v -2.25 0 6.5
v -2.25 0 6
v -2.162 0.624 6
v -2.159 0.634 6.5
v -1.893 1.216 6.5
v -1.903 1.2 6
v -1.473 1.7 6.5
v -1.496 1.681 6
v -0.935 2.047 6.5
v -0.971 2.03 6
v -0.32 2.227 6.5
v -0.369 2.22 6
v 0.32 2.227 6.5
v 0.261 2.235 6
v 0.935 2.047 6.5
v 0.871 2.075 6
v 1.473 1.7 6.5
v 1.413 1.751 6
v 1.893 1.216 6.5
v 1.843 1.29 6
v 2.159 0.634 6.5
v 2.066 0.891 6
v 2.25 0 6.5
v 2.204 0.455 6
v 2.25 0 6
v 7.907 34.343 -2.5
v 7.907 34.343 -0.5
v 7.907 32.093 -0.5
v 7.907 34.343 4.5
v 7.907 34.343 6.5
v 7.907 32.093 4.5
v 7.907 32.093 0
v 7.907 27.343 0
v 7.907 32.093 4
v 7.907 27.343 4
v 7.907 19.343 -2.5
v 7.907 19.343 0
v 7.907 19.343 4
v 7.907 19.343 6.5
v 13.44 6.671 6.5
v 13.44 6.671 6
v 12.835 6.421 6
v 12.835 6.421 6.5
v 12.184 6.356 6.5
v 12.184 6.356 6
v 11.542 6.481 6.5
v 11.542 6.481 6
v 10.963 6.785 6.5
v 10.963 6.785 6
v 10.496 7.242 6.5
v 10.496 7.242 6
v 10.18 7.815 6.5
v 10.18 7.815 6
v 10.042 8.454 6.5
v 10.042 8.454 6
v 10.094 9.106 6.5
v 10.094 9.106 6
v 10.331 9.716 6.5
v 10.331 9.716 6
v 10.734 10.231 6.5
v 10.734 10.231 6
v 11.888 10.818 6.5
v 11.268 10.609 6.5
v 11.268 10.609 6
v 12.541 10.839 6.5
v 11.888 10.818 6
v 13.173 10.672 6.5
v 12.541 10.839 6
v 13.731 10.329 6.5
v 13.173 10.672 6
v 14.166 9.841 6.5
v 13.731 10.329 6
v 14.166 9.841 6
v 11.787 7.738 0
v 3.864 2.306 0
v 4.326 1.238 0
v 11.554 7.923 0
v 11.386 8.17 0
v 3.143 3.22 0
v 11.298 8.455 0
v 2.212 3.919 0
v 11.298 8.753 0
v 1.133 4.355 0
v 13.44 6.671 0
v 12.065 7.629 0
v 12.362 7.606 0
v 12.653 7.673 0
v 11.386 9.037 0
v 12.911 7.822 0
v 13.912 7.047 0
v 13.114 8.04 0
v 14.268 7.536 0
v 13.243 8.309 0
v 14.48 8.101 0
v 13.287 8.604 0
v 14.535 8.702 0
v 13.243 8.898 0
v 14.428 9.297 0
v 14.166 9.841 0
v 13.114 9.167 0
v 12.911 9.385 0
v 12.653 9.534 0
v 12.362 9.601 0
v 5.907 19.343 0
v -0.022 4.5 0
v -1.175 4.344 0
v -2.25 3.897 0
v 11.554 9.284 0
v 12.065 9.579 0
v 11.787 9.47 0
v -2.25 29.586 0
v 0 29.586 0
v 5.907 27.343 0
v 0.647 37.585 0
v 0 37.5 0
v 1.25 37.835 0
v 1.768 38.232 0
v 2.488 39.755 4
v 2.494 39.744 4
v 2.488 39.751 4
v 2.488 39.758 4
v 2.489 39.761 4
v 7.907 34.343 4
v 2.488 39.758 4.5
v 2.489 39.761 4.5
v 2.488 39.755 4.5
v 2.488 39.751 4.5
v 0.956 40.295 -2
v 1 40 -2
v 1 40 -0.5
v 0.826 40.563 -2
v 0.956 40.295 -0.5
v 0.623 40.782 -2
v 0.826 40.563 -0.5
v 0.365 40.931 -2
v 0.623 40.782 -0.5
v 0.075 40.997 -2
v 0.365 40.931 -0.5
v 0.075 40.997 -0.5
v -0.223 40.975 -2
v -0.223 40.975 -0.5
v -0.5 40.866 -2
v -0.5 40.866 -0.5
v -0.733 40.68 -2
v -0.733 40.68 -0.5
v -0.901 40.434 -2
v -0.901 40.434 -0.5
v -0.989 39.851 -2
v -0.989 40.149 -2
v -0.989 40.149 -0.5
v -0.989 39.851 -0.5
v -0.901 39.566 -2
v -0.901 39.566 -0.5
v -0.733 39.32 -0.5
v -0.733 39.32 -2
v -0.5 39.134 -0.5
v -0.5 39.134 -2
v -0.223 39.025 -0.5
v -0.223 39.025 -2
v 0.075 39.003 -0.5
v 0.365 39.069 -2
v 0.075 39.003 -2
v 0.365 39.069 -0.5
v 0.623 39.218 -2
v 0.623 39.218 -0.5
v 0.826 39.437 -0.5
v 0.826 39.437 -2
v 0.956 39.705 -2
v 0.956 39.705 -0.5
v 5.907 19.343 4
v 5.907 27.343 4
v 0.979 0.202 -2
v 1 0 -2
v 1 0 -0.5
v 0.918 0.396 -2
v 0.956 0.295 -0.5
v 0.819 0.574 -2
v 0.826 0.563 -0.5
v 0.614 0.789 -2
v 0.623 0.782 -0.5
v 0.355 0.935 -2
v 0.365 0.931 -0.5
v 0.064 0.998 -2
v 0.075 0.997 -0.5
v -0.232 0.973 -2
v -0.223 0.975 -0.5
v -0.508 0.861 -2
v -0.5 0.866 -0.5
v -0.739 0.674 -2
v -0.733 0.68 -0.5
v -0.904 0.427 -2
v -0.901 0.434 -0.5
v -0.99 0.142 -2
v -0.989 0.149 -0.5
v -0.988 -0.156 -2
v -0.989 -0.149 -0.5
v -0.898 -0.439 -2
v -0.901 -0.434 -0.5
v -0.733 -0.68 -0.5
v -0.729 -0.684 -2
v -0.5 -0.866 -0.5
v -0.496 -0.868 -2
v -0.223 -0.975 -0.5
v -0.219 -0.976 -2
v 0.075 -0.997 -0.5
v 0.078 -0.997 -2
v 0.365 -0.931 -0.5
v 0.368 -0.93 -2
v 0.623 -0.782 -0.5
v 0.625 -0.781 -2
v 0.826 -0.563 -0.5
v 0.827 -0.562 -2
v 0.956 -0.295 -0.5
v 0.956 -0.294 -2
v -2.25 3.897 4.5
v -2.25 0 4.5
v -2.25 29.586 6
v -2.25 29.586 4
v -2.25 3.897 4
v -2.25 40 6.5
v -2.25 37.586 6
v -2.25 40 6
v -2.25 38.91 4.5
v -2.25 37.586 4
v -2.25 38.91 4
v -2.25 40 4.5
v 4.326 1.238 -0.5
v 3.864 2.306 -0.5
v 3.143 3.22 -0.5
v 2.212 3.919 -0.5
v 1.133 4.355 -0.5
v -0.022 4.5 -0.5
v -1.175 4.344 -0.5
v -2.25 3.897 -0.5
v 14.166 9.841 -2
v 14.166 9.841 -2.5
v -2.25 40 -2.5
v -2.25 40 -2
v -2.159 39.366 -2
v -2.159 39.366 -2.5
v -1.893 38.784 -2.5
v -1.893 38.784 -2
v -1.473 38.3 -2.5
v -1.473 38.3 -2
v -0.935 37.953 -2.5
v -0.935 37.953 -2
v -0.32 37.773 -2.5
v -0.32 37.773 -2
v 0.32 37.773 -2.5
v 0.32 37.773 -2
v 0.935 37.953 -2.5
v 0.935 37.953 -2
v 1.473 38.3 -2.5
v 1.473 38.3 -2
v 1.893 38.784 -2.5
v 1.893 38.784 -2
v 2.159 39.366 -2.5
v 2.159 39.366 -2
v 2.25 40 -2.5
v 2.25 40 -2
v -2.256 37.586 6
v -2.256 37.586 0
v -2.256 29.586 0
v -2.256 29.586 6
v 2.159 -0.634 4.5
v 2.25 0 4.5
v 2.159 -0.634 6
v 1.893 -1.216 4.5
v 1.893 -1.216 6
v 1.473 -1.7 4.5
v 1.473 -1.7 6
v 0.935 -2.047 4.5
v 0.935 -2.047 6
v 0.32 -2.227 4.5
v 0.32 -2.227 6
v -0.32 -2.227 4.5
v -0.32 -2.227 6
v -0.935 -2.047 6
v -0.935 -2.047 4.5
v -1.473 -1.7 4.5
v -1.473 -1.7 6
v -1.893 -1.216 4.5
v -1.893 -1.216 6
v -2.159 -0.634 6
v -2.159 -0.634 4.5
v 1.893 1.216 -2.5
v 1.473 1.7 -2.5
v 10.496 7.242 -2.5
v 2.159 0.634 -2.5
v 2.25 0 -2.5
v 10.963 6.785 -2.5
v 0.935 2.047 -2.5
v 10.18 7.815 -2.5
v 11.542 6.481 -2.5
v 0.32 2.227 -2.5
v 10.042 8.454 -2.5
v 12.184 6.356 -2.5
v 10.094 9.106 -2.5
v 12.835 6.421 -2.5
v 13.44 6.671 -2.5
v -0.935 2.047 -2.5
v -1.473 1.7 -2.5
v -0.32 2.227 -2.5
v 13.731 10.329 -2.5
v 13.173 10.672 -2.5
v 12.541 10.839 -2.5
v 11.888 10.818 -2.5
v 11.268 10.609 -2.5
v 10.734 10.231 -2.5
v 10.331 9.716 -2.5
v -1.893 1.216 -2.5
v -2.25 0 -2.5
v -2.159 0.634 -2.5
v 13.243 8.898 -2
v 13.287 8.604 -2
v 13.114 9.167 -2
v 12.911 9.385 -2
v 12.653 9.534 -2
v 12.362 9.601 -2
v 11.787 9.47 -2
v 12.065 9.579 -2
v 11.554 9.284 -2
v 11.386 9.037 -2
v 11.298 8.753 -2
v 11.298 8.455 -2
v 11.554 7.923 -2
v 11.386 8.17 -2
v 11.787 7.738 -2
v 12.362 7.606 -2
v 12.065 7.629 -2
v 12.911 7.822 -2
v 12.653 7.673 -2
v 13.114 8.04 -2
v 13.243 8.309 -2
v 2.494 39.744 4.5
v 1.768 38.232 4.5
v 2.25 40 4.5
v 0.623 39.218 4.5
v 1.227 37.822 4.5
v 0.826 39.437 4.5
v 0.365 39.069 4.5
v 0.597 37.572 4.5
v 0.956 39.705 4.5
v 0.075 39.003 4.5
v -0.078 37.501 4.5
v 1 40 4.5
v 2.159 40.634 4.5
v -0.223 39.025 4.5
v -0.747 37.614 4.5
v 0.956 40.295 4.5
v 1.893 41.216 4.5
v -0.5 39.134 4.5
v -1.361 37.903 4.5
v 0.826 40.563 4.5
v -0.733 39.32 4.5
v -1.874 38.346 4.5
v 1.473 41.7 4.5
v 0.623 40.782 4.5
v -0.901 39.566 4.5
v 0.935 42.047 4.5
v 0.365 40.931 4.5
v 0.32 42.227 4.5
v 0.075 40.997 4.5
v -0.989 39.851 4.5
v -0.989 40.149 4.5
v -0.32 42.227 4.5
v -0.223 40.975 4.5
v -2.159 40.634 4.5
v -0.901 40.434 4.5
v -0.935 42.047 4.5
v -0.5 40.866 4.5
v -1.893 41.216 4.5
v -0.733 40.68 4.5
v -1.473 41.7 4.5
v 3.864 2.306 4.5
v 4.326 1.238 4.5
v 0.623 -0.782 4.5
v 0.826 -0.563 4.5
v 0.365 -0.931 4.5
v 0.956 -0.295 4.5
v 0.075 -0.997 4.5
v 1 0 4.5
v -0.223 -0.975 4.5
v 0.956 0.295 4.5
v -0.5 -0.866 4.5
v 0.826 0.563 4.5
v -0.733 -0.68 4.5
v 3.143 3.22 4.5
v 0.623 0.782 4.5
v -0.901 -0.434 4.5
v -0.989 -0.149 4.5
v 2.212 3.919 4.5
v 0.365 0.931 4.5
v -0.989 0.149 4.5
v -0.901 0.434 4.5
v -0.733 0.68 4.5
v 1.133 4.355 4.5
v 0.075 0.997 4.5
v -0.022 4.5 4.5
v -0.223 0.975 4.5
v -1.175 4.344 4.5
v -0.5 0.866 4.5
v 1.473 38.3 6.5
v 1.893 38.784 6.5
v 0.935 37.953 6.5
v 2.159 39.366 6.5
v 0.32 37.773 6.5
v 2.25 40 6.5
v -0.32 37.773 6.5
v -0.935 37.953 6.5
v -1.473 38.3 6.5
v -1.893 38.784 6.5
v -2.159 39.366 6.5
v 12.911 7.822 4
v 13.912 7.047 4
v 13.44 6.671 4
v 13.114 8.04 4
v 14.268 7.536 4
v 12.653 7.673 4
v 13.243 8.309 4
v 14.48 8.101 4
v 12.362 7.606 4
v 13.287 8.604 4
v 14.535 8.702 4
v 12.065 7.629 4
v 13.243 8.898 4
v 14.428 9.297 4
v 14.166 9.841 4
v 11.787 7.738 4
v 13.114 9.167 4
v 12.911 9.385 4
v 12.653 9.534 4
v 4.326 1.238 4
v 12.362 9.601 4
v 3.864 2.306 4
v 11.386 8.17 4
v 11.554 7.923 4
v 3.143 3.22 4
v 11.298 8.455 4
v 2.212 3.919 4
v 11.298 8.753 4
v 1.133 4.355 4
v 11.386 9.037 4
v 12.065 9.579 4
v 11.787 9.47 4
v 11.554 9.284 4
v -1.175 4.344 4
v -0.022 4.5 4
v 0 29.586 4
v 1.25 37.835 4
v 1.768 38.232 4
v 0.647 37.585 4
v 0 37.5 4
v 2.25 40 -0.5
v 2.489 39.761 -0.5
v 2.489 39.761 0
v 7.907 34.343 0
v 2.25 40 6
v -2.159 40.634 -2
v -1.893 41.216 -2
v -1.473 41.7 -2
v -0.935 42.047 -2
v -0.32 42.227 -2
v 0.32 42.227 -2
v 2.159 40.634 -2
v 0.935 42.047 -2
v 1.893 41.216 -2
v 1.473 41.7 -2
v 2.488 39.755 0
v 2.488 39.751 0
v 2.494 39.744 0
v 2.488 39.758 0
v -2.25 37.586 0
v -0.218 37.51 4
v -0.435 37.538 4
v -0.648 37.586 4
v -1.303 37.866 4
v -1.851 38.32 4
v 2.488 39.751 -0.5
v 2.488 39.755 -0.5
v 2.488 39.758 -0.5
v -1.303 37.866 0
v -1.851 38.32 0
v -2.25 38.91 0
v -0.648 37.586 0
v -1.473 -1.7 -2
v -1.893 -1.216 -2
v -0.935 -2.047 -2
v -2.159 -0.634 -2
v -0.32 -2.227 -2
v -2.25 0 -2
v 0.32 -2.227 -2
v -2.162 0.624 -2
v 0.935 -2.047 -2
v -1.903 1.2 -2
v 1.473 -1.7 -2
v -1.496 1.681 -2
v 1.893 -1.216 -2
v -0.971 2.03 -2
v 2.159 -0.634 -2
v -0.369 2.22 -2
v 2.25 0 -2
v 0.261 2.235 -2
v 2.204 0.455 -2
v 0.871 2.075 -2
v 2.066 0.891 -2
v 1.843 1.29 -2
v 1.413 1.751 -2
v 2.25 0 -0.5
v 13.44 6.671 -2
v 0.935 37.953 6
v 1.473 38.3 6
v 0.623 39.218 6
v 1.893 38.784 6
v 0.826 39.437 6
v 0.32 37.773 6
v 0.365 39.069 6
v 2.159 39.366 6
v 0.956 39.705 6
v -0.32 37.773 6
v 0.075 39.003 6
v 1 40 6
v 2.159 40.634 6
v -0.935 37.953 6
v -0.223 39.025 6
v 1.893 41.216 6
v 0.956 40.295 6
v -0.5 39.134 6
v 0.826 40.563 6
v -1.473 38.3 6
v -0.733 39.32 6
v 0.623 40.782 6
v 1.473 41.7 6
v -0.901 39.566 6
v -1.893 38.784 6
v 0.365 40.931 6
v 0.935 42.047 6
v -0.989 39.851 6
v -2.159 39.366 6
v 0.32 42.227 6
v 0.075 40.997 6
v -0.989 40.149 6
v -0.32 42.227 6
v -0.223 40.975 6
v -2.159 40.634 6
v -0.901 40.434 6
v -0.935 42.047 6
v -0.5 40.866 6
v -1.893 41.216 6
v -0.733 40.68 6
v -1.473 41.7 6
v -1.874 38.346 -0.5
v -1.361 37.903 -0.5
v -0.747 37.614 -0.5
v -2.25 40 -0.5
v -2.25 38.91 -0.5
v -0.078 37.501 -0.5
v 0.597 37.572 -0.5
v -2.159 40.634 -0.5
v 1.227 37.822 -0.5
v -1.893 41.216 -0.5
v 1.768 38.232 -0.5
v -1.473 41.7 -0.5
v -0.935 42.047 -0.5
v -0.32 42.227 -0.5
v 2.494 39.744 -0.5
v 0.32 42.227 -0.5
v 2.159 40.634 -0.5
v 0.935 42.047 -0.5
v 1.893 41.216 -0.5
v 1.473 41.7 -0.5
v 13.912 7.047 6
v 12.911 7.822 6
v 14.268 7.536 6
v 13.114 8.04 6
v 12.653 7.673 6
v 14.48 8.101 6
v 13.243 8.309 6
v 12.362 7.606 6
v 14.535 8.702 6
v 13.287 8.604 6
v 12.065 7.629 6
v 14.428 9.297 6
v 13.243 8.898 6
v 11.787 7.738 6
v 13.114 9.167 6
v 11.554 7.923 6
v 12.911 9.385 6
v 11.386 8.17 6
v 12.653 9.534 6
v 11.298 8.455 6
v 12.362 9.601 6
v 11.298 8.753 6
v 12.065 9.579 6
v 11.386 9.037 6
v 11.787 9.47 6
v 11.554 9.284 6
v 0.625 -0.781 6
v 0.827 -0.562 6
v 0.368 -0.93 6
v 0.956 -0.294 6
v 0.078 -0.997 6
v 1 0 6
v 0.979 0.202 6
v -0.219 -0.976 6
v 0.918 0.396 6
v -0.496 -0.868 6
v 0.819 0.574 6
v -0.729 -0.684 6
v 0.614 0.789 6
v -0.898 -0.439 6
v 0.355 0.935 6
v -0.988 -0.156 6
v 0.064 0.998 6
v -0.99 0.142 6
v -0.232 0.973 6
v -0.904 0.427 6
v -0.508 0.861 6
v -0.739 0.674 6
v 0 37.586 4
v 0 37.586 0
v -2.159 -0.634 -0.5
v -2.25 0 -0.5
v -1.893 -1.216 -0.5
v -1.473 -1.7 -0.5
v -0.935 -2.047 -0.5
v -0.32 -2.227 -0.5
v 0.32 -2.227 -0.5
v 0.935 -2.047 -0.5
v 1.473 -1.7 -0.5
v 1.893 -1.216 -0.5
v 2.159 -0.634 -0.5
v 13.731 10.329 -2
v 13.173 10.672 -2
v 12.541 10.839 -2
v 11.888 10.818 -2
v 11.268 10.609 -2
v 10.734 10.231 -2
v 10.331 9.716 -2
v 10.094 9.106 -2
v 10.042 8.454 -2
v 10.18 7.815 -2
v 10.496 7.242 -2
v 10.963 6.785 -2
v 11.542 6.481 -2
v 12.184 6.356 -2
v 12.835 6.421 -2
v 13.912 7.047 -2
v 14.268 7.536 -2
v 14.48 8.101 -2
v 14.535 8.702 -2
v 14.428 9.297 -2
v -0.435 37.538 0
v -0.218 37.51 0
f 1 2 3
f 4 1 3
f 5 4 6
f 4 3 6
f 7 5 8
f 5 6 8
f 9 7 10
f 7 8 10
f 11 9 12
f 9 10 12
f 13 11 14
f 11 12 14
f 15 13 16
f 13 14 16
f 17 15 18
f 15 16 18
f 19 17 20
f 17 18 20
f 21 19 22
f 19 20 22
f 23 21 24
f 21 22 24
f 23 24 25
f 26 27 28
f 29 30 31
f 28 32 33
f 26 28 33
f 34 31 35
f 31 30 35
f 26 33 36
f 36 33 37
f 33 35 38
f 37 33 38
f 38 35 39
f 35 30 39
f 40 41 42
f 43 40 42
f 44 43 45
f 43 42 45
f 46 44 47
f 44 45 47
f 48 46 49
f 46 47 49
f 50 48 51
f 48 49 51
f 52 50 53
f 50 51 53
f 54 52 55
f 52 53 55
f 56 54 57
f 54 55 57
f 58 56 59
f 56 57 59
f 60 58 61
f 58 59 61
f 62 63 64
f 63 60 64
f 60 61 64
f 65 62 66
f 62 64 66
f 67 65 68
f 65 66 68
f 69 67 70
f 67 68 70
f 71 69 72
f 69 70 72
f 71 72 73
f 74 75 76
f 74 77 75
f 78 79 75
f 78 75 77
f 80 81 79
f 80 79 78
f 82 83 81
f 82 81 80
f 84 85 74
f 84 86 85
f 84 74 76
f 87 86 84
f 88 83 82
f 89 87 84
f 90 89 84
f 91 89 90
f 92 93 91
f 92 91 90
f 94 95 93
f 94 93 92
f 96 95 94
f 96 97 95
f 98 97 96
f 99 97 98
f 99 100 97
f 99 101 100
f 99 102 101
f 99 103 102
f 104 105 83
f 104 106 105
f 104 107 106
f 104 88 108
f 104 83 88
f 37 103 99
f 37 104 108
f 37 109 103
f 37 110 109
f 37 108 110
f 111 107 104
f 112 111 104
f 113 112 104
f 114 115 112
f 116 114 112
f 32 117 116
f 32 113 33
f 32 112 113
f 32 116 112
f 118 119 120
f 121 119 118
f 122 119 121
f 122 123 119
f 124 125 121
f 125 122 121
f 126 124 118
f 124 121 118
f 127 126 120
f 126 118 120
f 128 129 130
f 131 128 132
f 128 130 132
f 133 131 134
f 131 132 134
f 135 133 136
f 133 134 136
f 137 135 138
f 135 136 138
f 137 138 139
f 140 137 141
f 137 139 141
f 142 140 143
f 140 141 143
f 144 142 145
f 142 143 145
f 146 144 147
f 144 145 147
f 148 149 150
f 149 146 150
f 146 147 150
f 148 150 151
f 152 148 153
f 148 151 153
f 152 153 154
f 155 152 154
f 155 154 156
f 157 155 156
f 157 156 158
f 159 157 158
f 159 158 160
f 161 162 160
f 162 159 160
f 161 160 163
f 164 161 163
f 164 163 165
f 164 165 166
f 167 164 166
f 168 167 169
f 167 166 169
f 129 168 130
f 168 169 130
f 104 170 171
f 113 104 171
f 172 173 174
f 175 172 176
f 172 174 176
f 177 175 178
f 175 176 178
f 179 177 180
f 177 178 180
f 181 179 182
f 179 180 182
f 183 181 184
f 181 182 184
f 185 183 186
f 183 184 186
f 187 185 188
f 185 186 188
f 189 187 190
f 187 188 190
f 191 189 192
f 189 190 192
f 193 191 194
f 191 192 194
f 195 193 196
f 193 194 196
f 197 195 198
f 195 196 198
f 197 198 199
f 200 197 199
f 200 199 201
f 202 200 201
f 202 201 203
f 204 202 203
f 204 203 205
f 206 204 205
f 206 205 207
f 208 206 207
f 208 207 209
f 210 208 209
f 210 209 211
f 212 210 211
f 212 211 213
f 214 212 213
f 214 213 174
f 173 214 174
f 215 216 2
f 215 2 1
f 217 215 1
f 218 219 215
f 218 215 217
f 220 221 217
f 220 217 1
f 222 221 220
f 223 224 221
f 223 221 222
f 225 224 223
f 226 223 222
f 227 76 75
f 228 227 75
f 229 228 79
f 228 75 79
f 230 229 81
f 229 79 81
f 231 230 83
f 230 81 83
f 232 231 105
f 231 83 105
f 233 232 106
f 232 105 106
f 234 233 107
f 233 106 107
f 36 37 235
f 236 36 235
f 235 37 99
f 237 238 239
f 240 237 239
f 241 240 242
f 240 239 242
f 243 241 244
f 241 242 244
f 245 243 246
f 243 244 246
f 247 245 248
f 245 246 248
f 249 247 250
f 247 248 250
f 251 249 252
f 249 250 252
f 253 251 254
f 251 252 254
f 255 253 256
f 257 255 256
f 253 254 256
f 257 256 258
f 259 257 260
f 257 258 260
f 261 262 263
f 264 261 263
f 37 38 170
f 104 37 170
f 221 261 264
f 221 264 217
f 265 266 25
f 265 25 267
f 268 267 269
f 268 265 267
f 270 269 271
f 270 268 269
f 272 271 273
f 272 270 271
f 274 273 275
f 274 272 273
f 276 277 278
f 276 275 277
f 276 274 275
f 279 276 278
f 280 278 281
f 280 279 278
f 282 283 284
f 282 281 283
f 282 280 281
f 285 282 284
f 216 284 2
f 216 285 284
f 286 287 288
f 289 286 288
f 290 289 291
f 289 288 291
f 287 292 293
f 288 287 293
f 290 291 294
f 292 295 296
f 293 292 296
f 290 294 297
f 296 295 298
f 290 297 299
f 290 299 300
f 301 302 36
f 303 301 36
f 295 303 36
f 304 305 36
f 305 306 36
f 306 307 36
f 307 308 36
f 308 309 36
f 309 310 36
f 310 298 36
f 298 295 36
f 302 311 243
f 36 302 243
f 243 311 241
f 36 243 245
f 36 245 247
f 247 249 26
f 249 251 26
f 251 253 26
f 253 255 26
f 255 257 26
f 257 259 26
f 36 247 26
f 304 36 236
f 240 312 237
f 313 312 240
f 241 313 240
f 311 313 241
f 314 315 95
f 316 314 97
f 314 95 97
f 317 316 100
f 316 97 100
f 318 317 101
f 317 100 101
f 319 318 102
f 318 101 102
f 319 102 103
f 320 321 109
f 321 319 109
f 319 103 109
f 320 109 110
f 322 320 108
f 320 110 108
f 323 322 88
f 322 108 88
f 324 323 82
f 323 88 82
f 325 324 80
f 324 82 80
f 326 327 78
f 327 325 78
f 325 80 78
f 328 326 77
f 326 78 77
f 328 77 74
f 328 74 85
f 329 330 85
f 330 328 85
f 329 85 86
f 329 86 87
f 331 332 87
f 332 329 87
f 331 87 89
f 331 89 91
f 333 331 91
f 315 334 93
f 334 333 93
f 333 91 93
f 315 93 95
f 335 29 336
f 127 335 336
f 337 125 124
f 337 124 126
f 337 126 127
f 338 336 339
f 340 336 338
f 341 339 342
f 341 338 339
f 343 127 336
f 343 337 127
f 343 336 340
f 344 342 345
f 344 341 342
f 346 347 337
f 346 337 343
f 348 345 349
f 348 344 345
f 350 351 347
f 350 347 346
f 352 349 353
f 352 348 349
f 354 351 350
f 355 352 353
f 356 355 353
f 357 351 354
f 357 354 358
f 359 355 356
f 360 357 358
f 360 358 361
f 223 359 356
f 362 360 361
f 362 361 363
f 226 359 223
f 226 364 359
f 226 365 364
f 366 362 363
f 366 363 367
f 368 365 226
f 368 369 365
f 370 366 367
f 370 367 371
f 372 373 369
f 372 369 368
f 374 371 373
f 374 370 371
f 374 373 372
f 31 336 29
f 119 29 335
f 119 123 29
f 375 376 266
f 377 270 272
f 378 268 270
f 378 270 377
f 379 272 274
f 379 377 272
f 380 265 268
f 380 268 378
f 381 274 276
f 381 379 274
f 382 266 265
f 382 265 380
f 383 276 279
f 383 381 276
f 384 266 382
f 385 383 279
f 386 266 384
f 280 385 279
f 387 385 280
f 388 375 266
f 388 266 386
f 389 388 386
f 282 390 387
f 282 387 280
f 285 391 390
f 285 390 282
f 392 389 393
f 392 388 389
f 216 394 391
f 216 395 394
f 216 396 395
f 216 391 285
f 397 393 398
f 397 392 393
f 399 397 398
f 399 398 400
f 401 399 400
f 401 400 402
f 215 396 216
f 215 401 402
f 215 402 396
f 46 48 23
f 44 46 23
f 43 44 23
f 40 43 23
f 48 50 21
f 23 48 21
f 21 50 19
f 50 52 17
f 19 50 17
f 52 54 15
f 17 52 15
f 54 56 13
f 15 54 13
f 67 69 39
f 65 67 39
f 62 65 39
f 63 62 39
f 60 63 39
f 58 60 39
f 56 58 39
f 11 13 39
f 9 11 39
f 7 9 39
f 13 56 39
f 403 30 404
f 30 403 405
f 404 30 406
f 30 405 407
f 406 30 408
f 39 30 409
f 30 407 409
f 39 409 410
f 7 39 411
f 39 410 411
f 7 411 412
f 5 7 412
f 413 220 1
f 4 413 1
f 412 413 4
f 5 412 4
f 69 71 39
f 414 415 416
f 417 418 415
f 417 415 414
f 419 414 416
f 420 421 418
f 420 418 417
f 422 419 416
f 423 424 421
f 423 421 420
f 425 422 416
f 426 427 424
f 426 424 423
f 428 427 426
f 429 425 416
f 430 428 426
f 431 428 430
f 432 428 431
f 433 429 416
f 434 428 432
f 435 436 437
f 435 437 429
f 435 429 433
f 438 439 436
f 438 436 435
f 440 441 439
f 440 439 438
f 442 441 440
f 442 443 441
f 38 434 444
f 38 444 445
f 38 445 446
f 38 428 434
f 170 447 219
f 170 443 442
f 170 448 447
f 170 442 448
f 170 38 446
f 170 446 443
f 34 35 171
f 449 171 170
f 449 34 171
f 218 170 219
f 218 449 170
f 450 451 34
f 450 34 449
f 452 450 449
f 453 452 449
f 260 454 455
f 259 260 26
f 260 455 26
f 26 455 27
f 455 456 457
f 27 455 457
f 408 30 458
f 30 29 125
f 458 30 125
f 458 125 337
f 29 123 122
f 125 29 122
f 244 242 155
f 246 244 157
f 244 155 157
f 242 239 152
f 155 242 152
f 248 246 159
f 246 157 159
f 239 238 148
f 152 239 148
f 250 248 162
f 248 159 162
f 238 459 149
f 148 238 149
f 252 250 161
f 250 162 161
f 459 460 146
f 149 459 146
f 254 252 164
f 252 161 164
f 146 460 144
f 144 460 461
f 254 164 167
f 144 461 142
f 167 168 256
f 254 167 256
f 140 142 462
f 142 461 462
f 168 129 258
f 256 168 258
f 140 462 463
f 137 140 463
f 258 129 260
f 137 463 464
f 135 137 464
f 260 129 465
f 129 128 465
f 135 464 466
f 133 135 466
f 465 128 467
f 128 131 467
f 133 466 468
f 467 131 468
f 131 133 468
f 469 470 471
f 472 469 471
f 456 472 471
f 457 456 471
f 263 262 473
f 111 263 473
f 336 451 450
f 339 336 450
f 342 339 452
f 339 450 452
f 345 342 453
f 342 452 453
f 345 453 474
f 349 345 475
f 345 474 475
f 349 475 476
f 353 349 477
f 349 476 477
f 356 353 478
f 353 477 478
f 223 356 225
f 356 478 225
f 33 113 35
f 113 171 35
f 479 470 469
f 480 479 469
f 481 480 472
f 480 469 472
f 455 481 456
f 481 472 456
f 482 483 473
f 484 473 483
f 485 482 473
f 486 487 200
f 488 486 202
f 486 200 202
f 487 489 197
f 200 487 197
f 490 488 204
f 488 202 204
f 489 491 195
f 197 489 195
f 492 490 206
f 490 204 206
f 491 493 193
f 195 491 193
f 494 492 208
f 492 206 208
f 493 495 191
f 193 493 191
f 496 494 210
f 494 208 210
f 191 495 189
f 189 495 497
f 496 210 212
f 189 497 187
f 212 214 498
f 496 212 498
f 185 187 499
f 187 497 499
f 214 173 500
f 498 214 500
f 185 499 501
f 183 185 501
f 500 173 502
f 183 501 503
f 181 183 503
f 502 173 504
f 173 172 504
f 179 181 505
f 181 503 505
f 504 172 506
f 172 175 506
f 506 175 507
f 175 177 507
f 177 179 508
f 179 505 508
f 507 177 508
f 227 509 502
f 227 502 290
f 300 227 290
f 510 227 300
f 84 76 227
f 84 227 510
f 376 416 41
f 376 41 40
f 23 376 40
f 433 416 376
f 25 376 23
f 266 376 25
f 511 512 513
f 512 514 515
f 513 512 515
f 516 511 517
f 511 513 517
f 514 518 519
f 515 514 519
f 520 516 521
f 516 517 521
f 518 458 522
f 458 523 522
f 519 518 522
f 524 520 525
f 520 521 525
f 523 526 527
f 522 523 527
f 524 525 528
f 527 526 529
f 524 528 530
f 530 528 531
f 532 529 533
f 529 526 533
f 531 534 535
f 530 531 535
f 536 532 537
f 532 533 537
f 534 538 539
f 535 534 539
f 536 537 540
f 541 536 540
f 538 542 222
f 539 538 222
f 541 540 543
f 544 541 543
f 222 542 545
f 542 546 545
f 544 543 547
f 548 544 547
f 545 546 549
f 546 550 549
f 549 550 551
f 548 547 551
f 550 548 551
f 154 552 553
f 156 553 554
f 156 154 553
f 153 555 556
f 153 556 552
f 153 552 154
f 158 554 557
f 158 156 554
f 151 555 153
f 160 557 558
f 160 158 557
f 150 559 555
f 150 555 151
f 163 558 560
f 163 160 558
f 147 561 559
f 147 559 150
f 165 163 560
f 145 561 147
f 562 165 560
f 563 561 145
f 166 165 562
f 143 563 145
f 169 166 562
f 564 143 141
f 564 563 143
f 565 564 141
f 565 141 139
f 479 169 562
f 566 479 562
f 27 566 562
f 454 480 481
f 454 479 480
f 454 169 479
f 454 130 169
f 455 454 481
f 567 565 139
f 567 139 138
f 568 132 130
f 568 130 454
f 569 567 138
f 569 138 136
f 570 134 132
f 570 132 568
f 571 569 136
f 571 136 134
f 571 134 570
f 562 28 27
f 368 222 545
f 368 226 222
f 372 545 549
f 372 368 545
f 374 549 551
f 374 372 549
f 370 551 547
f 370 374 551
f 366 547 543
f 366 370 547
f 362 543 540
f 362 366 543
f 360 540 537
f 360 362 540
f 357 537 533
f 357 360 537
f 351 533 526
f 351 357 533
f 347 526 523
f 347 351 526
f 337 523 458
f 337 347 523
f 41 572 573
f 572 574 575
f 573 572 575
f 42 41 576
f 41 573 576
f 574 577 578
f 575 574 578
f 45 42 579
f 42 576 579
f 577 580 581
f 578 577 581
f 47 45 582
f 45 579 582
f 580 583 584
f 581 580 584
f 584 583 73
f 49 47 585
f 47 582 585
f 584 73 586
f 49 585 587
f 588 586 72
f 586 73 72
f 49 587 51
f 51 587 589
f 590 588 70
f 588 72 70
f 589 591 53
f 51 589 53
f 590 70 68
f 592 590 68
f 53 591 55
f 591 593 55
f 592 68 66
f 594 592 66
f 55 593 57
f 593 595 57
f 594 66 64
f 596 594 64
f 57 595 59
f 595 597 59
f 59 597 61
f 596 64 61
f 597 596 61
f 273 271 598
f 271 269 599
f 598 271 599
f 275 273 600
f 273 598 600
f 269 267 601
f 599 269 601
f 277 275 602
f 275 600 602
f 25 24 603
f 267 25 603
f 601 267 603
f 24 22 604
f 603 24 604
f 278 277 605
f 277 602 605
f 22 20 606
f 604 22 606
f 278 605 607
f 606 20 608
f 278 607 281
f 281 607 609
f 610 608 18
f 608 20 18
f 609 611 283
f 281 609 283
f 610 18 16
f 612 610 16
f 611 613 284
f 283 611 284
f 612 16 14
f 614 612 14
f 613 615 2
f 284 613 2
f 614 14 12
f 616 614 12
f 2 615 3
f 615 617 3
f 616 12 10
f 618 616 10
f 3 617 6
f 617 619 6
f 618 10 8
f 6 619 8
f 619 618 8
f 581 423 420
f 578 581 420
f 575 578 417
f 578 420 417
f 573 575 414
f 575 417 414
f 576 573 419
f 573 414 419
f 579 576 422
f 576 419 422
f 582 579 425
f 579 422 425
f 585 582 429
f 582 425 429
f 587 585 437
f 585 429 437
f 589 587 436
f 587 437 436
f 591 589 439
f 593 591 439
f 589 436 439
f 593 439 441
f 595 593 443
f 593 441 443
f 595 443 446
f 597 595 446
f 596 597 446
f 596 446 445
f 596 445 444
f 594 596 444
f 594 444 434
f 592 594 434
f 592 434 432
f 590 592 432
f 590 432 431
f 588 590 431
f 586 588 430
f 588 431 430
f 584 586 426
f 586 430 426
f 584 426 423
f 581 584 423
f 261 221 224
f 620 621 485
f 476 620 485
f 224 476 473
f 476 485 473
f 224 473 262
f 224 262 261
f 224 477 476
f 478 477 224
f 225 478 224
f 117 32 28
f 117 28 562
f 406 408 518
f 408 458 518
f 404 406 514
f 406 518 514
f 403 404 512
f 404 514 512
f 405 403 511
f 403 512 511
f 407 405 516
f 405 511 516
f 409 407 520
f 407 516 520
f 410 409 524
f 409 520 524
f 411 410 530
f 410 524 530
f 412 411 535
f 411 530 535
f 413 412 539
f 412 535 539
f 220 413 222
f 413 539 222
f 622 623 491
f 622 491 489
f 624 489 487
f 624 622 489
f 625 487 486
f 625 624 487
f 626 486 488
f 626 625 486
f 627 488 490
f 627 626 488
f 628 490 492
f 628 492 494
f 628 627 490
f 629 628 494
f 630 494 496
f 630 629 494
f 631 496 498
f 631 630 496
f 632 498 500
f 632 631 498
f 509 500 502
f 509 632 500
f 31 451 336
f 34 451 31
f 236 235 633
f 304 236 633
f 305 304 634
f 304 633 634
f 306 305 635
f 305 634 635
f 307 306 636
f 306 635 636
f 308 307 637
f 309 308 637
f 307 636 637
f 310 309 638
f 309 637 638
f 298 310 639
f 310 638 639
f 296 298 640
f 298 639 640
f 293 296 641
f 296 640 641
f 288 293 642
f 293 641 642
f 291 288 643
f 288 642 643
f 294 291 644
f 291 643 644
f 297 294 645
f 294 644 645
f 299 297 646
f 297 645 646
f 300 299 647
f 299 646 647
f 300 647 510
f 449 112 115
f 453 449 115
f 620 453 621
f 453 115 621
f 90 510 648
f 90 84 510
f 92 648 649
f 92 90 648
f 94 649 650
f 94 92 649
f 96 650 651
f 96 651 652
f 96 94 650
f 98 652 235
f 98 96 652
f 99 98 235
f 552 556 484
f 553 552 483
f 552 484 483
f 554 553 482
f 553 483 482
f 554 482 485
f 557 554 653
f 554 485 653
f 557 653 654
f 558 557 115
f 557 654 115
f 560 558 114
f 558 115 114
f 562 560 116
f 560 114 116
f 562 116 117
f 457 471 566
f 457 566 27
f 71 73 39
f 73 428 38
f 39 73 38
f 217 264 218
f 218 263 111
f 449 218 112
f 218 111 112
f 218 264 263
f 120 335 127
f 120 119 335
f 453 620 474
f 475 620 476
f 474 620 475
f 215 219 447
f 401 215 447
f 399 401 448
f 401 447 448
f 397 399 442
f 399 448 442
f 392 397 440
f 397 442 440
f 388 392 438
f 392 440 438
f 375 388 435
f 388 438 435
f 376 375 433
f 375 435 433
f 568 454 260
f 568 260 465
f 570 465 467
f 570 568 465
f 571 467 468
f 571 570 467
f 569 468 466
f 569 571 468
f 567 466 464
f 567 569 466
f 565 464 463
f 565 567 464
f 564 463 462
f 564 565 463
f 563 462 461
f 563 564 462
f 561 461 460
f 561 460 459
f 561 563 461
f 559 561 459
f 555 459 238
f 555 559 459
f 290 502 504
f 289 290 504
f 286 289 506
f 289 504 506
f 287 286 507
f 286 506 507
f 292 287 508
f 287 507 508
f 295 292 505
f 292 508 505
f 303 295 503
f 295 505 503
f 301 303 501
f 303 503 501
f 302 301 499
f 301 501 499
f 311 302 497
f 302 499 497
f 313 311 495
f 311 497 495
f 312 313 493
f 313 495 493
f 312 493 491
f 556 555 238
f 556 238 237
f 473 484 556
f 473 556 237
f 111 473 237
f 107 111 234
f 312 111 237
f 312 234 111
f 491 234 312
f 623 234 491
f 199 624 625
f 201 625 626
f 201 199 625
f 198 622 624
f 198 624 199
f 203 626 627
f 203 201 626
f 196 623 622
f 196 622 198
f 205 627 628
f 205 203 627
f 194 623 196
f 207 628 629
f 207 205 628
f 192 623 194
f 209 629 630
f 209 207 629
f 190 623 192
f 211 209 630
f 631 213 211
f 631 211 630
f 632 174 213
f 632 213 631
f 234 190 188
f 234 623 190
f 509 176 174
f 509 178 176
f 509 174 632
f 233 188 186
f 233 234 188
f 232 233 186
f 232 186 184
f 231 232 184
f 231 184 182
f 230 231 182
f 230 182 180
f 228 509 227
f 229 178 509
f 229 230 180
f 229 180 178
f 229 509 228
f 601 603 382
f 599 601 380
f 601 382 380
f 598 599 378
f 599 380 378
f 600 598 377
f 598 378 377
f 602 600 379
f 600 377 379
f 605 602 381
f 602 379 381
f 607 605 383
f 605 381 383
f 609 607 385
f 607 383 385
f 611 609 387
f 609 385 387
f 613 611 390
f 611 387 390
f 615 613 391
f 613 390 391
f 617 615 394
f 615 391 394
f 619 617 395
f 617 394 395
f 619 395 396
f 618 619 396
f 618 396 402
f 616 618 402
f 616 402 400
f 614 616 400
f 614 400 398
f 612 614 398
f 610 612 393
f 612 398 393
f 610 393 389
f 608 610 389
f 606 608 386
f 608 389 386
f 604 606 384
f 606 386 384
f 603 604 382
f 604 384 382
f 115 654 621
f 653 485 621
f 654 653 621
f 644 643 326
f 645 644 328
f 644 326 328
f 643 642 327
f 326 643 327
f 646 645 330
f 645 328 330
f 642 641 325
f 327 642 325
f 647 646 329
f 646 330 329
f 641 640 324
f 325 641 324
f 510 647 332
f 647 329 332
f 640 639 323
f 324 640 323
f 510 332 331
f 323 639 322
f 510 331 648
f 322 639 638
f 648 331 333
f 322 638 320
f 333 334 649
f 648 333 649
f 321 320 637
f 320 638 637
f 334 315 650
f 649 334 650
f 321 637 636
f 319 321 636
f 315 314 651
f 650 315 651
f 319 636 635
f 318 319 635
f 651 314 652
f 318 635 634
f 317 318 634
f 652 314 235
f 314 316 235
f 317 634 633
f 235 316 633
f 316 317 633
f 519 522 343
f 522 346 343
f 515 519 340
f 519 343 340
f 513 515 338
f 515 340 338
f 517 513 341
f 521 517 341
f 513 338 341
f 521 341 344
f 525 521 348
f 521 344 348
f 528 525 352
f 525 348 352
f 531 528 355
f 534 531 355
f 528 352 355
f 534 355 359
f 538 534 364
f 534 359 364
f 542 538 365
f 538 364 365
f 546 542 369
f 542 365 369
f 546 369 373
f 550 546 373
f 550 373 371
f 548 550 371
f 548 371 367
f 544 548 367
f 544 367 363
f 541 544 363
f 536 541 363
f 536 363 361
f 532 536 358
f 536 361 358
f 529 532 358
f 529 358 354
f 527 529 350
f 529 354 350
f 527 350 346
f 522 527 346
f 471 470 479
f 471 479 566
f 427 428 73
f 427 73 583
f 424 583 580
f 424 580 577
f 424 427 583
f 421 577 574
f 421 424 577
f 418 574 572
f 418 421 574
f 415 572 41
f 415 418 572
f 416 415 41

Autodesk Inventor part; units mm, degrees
ref_plane "YZ Plane" through (0, 0, 0) normal (1, 0, 0) x (0, 1, 0)
sketch "Sketch1" plane through (0, 0, 0) normal (0, 0, 1) x (1, 0, 0)
  circle A0 centre (0, 0) radius 1
  circle A1 centre (0, 0) radius 2.25
  circle A2 centre (0, 40) radius 1
  circle A3 centre (0, 40) radius 2.25
  line L0 (-2.25, 40) -> (-2.25, 0)
  line L1 (0, 0) -> (15, 0) construction
  line L2 (12.2873, 8.6036) -> (11.2873, 8.6036)
  circle A4 centre (12.2873, 8.6036) radius 1
  circle A5 centre (12.2873, 8.6036) radius 2.25
  line L3 (2.25, 0) -> (13.4395, 6.671)
  line L4 (2.25, 40) -> (7.9069, 34.3431)
  line L5 (7.9069, 34.3431) -> (7.9069, 19.3431)
  line L6 (7.9069, 19.3431) -> (14.1662, 9.8414)
  line L7 (0, 0) -> (0, 1)
  line L8 (0, 39) -> (0, 40)
  line L9 (0, 0) -> (1.8431, 1.2905)
  line L10 (11.4681, 8.0301) -> (12.2873, 8.6036)
  dimension "d5" = 2
  dimension "d7" = 2
  dimension "d0" = 40
  dimension "d6" = 4.5
  dimension "d8" = 4.5
  dimension "d9" = 15
  dimension "d11" = 2
  dimension "d12" = 4.5
  dimension "d13" = 8
  dimension "d15" = 15
ref_plane "Work Plane1" through (0, 0, 2) normal (0, 0, 1) x (1, 0, 0)
extrude "Extrusion1" add sketch "Sketch1" against normal blind 2.5 contours A1 L0 A3 L4 L5 L6 A5 L3
extrude "Extrusion2" add sketch "Sketch1" against normal blind 2 contours A1 | A5 | A3
mirror "Mirror1" about plane through (0, 0, 2) normal (0, 0, 1) of "Extrusion1", "Extrusion2"
sketch "Sketch2" plane through (0, 0, 0) normal (0, 0, 1) x (1, 0, 0)
  line L0 (0, 37.5855) -> (-2.2556, 37.5855)
  line L1 (-2.2556, 37.5855) -> (-2.2556, 29.5855)
  line L2 (-2.2556, 29.5855) -> (0, 29.5855)
  line L3 (0, 29.5855) -> (0, 37.5855)
  point P0 (0, 0)
  dimension "d21" = 8
extrude "Extrusion3" add sketch "Sketch2" along normal blind 6
sketch "Sketch3" plane through (0, 0, 6.5) normal (0, 0, 1) x (1, 0, 0)
  line L0 (7.9069, 19.3431) -> (5.9069, 19.3431)
  line L1 (5.9069, 19.3431) -> (5.9069, 27.3431)
  line L2 (5.9069, 27.3431) -> (7.9069, 27.3431)
  line L3 (7.9069, 27.3431) -> (7.9069, 19.3431)
  point P0 (0, 0)
  dimension "d24" = 2
  dimension "d25" = 8
extrude "Extrusion4" add sketch "Sketch3" against normal blind 9
sketch "Sketch6" plane through (0, 0, 4) normal (0, 0, -1) x (-1, 0, 0)
  circle A0 centre (0, 0) radius 4.5
  dimension "d33" = 9
extrude "Extrusion7" cut sketch "Sketch6" against normal blind 0.5
sketch "Sketch7" plane through (0, 0, 0) normal (0, 0, 1) x (1, 0, 0)
  circle A0 centre (0, 0) radius 4.5
  dimension "d36" = 9
extrude "Extrusion8" cut sketch "Sketch7" against normal blind 0.5
sketch "Sketch8" plane through (0, 40, 4) normal (0, 0, -1) x (-1, 0, 0)
  circle A0 centre (0, 0) radius 2.5
  line L0 (-1.7678, -1.7678) -> (-6.7819, -6.7819)
  circle A1 centre (0, 0) radius 2.5
  line L1 (-7.9069, -5.6569) -> (-2.4944, -0.2556)
  arc A2 (-2.4876, -0.2488) -> (-1.7678, -1.7678) centre (0, 0) ccw
  arc A3 (-2.4876, -0.2488) -> (-1.7678, -1.7678) centre (0, 0) ccw
  line L2 (-7.9069, -5.6569) -> (-2.4876, -0.2488)
  line L3 (-7.9069, -5.6569) -> (-7.9069, -7.9069)
  line L4 (-6.7819, -6.7819) -> (-7.9069, -7.9069)
  point P0 (0, -40)
  dimension "d39" = 5
extrude "Extrusion9" cut sketch "Sketch8" against normal blind 0.5
ref_plane "Work Plane2" through (0, 0, 2) normal (0, 0, -1) x (-1, 0, 0)
mirror "Mirror2" about plane through (0, 0, 2) normal (0, 0, -1) of "Extrusion9"
properties part number "Pinky_Lower_main_1"
